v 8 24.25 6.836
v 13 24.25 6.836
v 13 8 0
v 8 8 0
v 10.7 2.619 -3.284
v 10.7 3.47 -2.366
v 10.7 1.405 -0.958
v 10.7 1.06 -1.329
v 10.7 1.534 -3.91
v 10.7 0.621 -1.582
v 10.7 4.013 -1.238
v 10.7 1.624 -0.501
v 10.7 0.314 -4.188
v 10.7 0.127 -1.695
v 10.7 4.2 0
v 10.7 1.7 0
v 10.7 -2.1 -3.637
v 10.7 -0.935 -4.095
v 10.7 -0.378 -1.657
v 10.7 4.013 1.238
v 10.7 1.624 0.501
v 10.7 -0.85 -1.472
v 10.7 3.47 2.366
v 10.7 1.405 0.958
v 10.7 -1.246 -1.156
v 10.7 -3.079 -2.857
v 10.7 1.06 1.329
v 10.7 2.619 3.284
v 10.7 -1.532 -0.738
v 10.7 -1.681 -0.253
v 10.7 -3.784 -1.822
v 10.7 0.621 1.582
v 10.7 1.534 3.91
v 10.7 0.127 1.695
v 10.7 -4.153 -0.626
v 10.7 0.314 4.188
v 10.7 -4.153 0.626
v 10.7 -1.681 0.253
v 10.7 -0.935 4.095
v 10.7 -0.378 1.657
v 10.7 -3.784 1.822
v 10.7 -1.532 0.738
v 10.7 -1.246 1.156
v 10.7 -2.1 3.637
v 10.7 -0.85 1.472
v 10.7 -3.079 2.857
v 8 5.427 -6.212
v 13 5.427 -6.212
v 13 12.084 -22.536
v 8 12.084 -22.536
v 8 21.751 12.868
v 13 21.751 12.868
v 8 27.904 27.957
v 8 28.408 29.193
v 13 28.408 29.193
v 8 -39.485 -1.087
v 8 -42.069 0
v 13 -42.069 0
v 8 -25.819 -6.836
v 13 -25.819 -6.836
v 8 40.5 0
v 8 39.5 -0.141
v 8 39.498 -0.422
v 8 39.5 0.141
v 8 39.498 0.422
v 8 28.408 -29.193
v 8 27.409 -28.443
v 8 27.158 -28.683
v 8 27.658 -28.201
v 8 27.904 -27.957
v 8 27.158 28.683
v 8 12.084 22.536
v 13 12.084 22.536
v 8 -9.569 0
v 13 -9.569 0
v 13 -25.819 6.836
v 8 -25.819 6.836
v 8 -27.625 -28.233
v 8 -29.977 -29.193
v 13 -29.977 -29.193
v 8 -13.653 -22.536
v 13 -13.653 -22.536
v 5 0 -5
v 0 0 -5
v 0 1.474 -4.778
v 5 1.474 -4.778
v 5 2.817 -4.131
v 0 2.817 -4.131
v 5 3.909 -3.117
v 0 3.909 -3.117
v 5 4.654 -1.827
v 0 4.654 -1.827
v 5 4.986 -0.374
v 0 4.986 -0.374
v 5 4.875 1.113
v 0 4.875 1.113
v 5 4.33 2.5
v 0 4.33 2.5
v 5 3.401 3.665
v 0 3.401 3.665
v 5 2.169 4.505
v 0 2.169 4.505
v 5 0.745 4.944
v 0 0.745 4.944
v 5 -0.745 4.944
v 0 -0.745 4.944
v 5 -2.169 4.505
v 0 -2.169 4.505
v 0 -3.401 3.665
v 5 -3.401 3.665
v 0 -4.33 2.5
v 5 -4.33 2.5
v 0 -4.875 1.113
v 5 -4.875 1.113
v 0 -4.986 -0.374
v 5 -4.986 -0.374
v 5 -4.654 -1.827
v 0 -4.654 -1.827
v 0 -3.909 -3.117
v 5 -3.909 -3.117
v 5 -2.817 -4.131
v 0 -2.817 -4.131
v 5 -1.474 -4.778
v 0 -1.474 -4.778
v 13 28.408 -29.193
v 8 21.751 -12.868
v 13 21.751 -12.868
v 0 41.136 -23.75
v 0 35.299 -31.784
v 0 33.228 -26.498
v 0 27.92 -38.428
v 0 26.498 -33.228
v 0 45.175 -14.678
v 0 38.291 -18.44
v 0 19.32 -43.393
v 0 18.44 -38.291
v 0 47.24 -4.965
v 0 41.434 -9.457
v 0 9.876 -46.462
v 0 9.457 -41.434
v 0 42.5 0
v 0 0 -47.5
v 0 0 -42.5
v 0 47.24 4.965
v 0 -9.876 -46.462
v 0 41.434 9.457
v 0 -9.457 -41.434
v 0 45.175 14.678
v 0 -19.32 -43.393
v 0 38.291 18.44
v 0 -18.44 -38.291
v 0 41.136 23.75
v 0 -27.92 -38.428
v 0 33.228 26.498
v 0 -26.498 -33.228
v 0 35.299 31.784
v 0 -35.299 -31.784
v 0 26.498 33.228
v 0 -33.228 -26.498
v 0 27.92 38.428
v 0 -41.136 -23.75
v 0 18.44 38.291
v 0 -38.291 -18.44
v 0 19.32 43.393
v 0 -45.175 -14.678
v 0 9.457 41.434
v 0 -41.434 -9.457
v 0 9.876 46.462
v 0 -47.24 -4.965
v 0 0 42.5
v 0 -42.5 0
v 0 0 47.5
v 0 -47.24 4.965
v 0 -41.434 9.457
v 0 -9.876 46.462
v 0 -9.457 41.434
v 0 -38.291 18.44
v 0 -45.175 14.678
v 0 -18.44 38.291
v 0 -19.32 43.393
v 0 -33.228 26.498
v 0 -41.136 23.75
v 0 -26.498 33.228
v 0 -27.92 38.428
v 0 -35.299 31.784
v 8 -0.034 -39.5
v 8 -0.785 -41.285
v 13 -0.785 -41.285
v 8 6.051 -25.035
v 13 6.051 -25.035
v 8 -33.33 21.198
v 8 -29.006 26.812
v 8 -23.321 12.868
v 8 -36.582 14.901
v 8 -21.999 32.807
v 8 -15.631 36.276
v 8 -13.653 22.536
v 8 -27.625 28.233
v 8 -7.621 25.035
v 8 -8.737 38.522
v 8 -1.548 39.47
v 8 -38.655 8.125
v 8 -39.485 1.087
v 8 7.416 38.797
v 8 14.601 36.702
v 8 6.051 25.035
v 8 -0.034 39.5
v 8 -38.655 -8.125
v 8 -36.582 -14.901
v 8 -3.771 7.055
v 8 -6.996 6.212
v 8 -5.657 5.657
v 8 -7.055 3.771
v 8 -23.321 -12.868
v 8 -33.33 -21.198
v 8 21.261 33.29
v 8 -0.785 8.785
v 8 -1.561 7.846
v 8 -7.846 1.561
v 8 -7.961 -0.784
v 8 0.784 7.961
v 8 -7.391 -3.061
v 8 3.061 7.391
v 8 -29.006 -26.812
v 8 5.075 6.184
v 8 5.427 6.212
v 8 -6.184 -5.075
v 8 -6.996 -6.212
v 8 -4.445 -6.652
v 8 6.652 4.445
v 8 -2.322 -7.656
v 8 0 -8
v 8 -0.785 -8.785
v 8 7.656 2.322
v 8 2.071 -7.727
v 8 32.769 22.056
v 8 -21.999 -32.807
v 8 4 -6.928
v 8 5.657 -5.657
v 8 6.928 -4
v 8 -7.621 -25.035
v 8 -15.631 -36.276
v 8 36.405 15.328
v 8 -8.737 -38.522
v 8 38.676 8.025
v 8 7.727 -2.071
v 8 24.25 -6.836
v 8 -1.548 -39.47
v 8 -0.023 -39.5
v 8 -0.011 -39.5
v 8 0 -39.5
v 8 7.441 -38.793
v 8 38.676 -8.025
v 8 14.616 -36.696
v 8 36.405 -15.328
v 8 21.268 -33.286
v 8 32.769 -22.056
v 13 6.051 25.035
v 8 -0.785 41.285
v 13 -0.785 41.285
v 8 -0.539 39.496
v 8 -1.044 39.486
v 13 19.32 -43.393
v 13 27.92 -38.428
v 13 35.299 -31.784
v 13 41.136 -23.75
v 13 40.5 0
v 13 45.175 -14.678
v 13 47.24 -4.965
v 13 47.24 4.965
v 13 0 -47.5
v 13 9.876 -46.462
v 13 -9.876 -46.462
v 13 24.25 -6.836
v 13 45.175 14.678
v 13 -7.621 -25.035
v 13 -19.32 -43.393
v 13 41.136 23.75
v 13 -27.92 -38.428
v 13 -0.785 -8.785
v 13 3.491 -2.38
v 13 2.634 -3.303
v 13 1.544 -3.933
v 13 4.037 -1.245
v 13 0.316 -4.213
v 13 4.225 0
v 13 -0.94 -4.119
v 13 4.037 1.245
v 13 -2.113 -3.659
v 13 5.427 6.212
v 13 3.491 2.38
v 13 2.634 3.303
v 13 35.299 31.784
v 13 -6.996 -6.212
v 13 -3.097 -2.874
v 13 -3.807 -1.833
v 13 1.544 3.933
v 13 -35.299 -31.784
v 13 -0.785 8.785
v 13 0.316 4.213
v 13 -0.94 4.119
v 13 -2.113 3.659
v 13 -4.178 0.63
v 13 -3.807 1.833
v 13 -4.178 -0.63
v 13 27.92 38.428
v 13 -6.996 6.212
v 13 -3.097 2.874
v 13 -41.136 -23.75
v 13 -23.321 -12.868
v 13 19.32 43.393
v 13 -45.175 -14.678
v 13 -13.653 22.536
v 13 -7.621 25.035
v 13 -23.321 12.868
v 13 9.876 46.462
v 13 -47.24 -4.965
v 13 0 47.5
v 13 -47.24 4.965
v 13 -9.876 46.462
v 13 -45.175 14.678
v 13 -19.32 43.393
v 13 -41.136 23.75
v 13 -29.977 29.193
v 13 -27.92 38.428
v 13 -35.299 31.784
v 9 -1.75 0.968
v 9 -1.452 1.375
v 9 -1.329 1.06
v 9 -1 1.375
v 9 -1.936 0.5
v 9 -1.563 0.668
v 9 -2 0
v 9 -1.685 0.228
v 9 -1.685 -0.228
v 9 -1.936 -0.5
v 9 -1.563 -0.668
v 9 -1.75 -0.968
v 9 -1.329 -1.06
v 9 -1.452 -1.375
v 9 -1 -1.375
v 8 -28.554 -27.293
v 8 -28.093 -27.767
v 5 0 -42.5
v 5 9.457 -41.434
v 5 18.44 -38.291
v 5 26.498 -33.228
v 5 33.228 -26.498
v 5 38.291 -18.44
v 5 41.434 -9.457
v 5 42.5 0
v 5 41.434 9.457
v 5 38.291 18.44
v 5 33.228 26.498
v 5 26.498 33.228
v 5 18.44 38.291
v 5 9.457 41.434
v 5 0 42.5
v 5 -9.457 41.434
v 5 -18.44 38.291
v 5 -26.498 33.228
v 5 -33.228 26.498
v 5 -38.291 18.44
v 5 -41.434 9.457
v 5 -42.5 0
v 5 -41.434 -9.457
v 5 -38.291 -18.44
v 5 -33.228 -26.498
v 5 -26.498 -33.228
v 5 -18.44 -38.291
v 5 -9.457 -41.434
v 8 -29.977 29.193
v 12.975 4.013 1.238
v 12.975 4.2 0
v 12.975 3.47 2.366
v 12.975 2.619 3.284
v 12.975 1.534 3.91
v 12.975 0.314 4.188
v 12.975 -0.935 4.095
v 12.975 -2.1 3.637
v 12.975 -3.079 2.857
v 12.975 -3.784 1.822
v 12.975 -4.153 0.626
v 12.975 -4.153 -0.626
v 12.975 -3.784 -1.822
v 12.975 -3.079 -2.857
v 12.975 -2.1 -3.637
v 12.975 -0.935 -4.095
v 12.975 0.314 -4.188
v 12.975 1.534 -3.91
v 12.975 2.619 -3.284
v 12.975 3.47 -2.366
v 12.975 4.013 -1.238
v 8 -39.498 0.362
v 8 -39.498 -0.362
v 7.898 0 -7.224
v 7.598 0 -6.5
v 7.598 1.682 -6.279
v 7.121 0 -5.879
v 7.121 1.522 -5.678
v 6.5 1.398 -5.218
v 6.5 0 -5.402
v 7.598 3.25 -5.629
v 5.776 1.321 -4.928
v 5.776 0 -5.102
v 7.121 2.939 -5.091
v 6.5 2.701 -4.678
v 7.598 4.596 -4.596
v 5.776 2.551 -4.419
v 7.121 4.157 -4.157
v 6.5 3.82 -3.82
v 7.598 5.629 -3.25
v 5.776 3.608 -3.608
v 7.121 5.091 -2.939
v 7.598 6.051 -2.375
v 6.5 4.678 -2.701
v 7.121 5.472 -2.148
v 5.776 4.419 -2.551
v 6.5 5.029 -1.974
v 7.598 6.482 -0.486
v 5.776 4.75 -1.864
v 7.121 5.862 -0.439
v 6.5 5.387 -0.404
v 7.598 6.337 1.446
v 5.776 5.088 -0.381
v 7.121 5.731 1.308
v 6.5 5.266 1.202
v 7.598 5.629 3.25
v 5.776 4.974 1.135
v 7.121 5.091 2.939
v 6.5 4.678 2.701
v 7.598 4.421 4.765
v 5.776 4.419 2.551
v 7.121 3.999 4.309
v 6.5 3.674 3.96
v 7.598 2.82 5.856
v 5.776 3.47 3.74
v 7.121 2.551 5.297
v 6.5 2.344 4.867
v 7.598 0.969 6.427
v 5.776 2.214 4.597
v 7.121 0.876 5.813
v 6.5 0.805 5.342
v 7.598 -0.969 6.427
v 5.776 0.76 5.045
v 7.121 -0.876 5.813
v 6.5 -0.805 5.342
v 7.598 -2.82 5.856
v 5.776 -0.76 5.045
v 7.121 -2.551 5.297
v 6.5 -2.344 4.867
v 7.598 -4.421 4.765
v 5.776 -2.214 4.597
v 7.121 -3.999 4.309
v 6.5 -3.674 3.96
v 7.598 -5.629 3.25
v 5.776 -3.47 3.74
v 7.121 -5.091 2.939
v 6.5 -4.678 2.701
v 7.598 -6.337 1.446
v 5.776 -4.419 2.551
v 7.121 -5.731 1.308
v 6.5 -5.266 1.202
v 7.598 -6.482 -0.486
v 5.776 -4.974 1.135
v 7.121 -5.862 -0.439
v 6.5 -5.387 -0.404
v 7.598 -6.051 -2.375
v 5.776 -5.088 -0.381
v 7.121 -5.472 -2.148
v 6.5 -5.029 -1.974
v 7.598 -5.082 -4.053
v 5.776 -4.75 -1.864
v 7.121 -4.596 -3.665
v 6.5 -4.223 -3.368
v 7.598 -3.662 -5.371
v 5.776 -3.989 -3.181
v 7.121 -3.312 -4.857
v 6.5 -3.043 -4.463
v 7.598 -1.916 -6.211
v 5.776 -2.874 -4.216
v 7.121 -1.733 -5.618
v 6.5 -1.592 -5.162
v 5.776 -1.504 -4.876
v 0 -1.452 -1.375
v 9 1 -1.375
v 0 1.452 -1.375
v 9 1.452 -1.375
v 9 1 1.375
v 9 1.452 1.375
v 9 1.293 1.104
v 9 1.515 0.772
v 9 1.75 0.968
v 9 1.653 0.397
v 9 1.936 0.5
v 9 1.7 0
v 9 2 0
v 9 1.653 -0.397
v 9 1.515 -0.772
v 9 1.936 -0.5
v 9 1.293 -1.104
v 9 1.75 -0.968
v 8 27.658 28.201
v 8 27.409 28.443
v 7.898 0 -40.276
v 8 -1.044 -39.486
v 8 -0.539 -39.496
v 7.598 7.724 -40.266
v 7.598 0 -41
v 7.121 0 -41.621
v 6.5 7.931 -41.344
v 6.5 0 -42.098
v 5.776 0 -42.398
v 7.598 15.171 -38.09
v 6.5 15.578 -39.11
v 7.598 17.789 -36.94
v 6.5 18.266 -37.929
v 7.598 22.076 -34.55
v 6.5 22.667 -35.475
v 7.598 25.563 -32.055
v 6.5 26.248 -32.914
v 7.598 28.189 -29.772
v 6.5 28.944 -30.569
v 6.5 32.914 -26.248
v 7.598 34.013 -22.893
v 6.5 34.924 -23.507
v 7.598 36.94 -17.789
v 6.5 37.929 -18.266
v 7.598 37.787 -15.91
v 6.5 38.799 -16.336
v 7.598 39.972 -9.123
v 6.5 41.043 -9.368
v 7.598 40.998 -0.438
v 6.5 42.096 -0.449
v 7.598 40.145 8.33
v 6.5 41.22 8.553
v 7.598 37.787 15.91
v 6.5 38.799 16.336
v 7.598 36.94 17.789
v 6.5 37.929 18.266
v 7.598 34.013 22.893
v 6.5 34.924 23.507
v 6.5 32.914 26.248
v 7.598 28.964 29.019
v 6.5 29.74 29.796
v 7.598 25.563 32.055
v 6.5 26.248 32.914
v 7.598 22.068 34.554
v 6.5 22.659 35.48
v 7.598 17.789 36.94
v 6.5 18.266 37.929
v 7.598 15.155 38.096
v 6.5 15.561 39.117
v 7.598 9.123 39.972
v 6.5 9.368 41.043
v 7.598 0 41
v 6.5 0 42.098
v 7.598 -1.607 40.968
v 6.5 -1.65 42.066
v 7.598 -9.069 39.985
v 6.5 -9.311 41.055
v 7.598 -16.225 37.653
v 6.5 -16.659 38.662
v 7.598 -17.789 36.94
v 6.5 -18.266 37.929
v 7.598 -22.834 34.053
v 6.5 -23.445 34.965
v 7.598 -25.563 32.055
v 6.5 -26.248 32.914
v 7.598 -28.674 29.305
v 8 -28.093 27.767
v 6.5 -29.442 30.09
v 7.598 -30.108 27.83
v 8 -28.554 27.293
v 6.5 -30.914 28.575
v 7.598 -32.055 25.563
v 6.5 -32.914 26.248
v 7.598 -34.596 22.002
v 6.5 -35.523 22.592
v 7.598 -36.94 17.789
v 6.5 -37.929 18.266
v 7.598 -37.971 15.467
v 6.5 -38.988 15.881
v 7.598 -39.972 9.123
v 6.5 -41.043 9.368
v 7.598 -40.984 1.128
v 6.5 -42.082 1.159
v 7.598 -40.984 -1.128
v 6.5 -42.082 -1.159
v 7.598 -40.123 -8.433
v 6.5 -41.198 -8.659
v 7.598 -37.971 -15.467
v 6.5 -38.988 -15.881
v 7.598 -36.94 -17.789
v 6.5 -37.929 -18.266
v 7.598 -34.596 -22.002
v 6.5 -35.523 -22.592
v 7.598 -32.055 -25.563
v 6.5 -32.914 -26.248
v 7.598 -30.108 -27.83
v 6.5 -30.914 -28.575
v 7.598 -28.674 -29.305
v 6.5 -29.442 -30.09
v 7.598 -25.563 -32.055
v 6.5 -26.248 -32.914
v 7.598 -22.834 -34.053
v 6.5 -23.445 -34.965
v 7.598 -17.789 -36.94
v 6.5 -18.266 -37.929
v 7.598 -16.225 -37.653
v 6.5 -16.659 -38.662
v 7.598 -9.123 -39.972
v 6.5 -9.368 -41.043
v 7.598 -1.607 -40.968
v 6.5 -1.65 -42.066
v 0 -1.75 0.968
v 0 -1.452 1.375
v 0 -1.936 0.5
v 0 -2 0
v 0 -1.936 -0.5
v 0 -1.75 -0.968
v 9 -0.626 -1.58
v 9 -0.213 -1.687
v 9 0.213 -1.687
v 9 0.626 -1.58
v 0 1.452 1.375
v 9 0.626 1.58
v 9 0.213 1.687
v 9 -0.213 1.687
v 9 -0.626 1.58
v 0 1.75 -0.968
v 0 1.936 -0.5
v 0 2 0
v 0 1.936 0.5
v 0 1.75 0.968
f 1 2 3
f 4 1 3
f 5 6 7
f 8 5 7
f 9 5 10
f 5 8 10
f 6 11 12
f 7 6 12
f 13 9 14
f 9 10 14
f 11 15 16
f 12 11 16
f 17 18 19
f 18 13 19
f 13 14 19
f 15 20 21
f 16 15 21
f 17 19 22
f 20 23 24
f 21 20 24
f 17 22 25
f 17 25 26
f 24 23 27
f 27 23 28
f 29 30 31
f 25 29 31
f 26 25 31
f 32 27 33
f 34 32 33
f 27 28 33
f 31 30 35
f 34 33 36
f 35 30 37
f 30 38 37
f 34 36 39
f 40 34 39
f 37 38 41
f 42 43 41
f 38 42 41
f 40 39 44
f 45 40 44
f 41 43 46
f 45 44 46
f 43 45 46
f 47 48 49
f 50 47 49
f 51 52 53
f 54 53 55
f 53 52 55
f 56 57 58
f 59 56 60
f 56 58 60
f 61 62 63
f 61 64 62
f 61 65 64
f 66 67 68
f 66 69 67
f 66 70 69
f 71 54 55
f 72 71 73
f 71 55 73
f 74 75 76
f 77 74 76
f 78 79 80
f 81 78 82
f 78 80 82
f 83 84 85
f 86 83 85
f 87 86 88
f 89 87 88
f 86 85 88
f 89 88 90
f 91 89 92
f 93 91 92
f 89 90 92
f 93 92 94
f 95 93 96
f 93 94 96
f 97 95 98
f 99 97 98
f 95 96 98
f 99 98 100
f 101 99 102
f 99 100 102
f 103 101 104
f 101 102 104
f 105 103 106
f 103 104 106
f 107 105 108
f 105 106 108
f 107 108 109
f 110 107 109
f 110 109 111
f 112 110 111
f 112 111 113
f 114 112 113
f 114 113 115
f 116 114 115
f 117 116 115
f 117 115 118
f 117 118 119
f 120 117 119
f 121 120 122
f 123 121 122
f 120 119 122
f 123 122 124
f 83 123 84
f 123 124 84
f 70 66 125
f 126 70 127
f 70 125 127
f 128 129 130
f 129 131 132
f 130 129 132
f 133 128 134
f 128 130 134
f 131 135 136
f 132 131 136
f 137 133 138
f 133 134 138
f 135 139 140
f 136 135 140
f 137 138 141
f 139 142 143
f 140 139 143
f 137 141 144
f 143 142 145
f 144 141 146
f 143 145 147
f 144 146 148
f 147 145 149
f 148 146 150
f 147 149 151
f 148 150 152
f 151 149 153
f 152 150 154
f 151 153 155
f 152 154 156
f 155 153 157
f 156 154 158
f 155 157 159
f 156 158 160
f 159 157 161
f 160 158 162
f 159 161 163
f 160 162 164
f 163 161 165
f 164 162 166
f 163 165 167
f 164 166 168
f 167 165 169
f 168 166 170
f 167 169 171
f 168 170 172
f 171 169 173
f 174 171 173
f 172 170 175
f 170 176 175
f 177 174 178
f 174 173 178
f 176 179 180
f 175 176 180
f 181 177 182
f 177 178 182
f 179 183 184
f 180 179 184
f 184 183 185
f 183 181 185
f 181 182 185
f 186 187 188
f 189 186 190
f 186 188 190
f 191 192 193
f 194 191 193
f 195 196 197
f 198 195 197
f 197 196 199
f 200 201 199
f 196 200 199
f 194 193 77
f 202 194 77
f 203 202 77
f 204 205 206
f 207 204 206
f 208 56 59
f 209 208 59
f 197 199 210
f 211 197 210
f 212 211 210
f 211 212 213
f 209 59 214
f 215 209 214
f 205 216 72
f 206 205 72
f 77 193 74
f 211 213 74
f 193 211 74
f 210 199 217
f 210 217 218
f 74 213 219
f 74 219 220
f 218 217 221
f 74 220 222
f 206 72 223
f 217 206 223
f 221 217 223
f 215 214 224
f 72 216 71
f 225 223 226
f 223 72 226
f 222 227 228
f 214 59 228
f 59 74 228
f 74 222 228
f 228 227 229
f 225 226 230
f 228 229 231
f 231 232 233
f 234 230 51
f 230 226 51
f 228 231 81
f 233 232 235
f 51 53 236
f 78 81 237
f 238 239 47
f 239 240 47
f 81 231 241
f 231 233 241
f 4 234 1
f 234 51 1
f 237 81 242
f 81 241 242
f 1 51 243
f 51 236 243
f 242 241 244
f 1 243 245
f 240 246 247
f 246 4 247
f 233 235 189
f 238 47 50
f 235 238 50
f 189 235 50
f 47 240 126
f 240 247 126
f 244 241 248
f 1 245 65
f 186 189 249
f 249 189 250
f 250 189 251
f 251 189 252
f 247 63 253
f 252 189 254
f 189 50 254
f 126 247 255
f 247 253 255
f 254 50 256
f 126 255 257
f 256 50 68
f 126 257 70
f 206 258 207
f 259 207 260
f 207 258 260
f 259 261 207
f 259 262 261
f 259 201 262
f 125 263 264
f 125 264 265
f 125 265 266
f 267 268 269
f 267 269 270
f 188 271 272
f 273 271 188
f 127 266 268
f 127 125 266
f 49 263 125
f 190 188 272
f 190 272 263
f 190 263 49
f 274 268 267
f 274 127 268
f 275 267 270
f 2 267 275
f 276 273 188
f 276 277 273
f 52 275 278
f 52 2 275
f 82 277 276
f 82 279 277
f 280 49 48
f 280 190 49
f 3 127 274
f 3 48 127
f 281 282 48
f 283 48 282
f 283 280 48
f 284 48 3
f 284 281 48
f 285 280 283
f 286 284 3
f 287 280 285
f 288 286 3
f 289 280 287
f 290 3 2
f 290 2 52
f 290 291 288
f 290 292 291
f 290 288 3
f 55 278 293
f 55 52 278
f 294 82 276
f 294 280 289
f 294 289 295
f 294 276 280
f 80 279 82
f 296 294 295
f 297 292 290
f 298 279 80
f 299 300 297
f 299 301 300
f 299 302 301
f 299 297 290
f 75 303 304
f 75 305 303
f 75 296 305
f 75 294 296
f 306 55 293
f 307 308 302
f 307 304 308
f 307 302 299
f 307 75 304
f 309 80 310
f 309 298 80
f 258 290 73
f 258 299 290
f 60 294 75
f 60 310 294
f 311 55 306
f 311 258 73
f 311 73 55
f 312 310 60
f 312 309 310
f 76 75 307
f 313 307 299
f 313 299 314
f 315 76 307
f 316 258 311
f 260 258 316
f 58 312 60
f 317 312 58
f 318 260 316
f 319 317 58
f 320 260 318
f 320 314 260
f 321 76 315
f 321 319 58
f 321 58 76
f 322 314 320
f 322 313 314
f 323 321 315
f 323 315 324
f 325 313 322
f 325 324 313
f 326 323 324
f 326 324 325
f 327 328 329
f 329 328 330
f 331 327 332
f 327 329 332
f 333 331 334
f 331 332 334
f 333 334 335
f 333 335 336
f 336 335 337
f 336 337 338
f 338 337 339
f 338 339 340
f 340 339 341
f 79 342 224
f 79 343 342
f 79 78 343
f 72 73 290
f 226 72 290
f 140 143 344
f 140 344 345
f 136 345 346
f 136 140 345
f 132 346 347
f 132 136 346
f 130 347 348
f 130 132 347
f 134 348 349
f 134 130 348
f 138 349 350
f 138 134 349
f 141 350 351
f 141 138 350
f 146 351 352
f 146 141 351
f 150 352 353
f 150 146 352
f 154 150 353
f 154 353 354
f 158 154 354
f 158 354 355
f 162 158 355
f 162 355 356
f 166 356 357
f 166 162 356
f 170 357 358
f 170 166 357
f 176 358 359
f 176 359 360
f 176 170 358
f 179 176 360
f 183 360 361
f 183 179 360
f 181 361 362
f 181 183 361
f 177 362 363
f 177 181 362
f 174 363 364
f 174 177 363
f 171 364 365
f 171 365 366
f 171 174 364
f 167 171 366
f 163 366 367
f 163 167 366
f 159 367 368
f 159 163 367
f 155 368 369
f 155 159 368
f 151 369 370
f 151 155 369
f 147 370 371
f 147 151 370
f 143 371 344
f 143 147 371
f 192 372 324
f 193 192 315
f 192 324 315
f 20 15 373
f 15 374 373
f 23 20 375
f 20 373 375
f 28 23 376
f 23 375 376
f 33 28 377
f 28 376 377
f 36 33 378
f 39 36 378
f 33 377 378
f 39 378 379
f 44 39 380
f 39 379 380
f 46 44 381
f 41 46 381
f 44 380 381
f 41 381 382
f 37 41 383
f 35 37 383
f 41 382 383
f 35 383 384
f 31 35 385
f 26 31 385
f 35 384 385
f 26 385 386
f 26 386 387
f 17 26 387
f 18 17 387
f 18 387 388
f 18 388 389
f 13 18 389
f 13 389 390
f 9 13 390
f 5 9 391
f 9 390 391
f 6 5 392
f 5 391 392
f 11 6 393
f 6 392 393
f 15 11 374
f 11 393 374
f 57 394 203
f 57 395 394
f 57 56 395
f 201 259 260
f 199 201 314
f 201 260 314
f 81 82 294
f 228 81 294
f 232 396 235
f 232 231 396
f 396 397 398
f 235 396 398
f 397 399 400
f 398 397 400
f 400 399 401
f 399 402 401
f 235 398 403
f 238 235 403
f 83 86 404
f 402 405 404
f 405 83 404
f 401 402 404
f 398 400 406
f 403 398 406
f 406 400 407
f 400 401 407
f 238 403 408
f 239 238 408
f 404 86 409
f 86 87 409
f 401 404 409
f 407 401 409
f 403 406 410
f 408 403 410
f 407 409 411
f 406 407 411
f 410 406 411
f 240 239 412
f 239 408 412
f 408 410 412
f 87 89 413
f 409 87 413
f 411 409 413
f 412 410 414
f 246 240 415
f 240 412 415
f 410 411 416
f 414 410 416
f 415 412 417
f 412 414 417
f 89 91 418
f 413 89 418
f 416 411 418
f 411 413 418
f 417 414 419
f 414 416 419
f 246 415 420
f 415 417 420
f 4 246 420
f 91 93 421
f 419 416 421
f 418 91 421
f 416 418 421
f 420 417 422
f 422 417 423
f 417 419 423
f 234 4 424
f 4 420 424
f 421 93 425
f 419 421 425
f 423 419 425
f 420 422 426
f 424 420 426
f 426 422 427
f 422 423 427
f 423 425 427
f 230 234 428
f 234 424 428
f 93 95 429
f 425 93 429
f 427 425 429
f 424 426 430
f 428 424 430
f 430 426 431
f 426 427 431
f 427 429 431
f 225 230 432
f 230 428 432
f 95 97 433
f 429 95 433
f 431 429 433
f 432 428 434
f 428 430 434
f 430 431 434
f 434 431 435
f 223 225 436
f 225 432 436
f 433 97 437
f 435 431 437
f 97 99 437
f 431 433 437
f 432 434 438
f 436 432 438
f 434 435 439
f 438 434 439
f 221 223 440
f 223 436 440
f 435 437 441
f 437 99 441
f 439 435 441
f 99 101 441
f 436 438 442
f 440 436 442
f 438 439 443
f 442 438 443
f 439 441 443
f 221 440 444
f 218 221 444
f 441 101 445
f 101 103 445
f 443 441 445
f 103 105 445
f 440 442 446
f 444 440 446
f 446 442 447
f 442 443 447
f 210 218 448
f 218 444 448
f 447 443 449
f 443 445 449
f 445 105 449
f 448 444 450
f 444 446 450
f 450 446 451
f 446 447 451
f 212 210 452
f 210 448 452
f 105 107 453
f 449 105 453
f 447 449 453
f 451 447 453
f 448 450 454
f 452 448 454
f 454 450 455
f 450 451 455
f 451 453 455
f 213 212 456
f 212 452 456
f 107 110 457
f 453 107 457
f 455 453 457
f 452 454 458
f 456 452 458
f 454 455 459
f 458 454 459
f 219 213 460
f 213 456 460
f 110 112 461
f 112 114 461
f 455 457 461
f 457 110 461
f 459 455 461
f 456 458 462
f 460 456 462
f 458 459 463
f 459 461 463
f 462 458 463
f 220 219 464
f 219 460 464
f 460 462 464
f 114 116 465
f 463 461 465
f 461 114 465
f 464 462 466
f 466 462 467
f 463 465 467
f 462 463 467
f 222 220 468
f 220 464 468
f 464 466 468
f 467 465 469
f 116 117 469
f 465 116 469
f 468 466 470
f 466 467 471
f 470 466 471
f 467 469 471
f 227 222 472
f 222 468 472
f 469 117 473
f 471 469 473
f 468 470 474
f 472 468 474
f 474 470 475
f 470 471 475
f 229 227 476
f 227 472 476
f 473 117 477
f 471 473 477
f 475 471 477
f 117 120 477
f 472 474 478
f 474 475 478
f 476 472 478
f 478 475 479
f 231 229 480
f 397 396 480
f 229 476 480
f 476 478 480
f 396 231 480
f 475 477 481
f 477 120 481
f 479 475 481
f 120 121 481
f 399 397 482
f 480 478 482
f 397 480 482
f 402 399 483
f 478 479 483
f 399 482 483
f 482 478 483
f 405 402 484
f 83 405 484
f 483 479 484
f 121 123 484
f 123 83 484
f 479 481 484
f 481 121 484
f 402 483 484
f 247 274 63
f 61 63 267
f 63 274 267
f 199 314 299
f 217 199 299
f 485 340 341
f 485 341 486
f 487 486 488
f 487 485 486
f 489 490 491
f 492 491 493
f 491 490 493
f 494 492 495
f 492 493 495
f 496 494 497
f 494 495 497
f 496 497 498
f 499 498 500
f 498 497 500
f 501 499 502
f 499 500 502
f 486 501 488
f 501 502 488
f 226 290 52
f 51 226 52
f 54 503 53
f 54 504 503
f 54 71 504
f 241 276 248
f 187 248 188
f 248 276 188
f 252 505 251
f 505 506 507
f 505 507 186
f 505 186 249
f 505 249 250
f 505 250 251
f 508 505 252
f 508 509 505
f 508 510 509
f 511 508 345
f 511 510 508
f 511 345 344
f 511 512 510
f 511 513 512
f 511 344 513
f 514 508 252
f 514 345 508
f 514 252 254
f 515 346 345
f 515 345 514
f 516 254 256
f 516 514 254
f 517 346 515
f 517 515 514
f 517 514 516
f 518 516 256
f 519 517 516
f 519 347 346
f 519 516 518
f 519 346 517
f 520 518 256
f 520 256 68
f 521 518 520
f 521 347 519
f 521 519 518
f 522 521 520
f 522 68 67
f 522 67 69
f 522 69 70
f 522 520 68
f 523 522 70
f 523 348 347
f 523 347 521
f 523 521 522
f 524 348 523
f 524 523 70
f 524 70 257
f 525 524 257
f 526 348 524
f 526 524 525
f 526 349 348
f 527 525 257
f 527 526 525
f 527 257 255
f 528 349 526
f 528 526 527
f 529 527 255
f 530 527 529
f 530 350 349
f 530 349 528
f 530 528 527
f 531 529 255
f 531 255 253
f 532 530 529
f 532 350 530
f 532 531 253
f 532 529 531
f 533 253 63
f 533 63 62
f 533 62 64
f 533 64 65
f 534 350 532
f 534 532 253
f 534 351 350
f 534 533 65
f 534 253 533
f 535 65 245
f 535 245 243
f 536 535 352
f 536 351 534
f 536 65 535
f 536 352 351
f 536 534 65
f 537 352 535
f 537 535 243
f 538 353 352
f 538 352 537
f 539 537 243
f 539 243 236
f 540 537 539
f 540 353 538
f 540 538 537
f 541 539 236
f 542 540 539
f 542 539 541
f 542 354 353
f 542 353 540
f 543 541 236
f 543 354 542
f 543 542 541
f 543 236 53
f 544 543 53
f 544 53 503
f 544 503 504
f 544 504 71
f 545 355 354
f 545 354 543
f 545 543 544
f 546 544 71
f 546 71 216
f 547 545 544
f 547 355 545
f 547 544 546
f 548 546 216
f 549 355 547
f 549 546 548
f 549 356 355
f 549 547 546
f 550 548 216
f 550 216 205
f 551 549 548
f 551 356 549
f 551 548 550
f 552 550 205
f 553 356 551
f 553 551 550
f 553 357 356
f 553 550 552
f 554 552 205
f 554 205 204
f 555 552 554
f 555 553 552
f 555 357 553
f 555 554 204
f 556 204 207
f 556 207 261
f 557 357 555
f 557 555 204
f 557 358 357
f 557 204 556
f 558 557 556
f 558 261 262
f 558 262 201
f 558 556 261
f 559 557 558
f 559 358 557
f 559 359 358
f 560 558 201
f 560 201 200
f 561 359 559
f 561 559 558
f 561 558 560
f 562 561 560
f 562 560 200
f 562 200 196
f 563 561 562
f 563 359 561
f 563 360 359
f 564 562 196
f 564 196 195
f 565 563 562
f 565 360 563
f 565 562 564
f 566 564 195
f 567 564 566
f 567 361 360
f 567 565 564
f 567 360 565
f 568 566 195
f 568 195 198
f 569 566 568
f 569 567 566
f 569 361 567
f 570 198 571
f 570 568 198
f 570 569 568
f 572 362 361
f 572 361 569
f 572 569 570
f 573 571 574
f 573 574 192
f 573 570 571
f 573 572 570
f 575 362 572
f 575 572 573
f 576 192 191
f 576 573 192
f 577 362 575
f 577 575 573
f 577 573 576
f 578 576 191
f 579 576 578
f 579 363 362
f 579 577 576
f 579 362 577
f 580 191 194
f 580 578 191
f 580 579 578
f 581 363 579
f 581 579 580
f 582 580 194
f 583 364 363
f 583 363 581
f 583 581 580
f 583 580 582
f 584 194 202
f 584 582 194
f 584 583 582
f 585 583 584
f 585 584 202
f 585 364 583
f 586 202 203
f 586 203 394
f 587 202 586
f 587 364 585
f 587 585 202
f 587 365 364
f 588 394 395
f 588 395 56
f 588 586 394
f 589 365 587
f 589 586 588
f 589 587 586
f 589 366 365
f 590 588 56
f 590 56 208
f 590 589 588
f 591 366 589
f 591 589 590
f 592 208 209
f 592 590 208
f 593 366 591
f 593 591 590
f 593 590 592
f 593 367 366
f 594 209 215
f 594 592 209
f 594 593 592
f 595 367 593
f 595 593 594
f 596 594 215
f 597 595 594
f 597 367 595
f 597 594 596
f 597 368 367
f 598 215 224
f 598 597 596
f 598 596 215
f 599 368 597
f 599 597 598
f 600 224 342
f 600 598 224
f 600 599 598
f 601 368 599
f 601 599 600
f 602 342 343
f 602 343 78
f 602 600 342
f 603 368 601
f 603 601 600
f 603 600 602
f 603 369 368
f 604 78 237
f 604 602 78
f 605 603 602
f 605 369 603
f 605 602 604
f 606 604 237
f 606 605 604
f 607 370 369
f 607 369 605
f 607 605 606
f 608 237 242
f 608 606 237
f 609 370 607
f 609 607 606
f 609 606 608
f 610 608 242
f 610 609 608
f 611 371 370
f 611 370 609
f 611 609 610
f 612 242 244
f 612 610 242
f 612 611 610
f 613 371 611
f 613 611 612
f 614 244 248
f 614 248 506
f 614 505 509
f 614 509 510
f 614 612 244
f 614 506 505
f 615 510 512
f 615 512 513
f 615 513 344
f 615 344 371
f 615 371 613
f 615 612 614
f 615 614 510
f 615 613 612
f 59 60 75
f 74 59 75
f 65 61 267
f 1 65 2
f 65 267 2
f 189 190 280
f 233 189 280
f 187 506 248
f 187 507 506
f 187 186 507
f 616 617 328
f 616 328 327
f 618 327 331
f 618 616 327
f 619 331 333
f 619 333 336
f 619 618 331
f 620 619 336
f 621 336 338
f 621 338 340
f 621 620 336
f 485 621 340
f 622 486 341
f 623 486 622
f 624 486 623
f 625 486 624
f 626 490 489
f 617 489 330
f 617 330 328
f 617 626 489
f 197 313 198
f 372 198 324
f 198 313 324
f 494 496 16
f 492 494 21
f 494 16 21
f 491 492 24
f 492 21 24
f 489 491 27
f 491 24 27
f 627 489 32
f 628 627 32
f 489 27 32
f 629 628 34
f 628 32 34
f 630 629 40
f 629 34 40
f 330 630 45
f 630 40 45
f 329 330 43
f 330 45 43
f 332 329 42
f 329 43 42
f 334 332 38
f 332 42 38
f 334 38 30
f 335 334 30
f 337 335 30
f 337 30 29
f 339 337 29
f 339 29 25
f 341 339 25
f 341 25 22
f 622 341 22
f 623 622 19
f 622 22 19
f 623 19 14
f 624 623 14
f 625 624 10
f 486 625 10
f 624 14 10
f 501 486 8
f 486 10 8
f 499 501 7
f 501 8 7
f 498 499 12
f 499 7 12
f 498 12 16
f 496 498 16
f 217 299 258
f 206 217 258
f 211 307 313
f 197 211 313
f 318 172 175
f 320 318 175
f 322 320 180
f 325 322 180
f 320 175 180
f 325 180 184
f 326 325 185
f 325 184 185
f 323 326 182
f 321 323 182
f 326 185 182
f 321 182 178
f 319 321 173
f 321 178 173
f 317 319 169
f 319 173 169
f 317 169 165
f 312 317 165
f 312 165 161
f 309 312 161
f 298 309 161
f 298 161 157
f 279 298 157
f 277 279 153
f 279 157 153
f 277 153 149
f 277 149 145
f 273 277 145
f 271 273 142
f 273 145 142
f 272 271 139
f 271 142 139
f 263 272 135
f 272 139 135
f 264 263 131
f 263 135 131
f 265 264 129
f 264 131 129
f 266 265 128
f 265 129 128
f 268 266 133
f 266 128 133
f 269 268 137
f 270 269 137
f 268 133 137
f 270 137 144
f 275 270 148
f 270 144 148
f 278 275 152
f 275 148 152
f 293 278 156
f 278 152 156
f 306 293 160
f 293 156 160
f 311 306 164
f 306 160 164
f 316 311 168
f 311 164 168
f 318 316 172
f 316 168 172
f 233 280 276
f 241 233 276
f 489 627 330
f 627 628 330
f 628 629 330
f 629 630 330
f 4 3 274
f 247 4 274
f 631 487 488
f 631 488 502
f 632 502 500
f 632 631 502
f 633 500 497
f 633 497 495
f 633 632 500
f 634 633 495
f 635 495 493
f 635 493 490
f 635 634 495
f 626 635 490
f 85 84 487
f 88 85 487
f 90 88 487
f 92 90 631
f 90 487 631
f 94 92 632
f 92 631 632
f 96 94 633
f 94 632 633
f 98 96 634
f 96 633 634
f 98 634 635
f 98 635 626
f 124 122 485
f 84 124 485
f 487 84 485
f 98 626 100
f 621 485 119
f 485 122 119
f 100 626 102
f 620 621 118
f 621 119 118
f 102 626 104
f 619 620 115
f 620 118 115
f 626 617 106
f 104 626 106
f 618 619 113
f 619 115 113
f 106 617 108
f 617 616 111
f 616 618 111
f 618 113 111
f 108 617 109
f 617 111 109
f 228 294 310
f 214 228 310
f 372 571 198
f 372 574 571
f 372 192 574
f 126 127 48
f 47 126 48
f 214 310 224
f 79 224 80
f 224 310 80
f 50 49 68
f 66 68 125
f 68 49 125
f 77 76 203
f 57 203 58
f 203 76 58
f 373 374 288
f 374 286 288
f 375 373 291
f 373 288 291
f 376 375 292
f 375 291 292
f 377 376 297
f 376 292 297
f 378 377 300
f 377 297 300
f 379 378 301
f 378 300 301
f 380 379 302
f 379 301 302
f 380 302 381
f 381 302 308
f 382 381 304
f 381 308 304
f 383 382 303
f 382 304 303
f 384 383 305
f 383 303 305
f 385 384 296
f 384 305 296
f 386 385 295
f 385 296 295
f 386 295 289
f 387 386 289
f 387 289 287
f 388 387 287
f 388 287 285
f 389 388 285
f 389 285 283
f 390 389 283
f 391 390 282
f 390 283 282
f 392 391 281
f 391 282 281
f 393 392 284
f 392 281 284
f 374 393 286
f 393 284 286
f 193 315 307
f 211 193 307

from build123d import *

# Parameters (mm, degrees)
SKETCH2_R           = 47.5
BOSS_EXTRUDE1_DEPTH = 13
SKETCH2_4_R         = 42.5
SKETCH2_4_R_2       = 5
CUT_EXTRUDE1_DEPTH  = 8
CUT_EXTRUDE2_DEPTH  = 9
FILLET1_R           = 3
FILLET2_R           = 3
CUT_EXTRUDE4_DEPTH  = 5
CIRPATTERN1_COUNT   = 8


# Read off the part's stored shape, not the designer's step: CBORE for M3 Hex Head Machine Screw1
with BuildPart() as part:
    # Sketch2 → Boss-Extrude1 (new body)
    with BuildSketch(Plane(origin=(0, 0, 0), x_dir=(0, 0, -1), z_dir=(1, 0, 0))):
        with Locations(Location((0, 0, 0), (0, 0, 180))):
            Circle(SKETCH2_R)
    extrude(amount=BOSS_EXTRUDE1_DEPTH)

    # Sketch2<4> → Cut-Extrude1 (cut)
    with BuildSketch(Plane(origin=(0, 0, 0), x_dir=(0, 0, -1), z_dir=(1, 0, 0))):
        Circle(SKETCH2_4_R)
        Circle(SKETCH2_4_R_2, mode=Mode.SUBTRACT)
    extrude(amount=CUT_EXTRUDE1_DEPTH, mode=Mode.SUBTRACT)

    # Sketch2<5> → Cut-Extrude2 (cut)
    with BuildSketch(Plane(origin=(0, 0, 0), x_dir=(0, 0, -1), z_dir=(1, 0, 0))):
        with BuildLine():
            ThreePointArc((1.375, 1.452368755), (0, 2), (-1.375, 1.452368755))
            Line((-1.375, 1.452368755), (-1.375, -1.452368755))
            ThreePointArc((-1.375, -1.452368755), (0, -2), (1.375, -1.452368755))
            Line((1.375, -1.452368755), (1.375, 1.452368755))
        make_face()
    extrude(amount=CUT_EXTRUDE2_DEPTH, mode=Mode.SUBTRACT)

    # Fillet1
    fillet1_edges = [part.edges().sort_by_distance(p)[0] for p in [
        (8, 0, 5),
    ]]
    fillet(fillet1_edges, radius=FILLET1_R)

    # Fillet2
    fillet2_edges = [part.edges().sort_by_distance(p)[0] for p in [
        (8, 0, 42.5),
    ]]
    fillet(fillet2_edges, radius=FILLET2_R)

    # Sketch4 → Cut-Extrude4 (cut)
    with BuildSketch(Plane(origin=(13, 0, 0), x_dir=(0, 0, -1), z_dir=(1, 0, 0))):
        Polygon((0, 8), (6.83592916, 24.25), (0, 40.5), (-6.83592916, 24.25), align=None)
    cut_extrude4 = extrude(amount=-CUT_EXTRUDE4_DEPTH, mode=Mode.SUBTRACT)

    # CirPattern1: Cut-Extrude4 ×8 about axis
    cirpattern1_axis = Axis((0, -0.784667472, 0), (1, 0, 0))
    for i in range(1, CIRPATTERN1_COUNT):
        add(cut_extrude4.rotate(cirpattern1_axis, i * 360 / CIRPATTERN1_COUNT), mode=Mode.SUBTRACT)

    # CBORE for M3 Hex Head Machine Screw1 out → CBORE for M3 Hex Head Machine Screw1 (revolve, cut)
    with BuildSketch(Plane.YX):
        Polygon((0, 9), (1.7, 9), (1.7, 10.7), (4.2, 10.7), (4.2, 12.975), (4.225, 13), (0, 13), align=None)
    revolve(axis=Axis((0, 0, 0), (1, 0, 0)), mode=Mode.SUBTRACT)


solid = part.part
